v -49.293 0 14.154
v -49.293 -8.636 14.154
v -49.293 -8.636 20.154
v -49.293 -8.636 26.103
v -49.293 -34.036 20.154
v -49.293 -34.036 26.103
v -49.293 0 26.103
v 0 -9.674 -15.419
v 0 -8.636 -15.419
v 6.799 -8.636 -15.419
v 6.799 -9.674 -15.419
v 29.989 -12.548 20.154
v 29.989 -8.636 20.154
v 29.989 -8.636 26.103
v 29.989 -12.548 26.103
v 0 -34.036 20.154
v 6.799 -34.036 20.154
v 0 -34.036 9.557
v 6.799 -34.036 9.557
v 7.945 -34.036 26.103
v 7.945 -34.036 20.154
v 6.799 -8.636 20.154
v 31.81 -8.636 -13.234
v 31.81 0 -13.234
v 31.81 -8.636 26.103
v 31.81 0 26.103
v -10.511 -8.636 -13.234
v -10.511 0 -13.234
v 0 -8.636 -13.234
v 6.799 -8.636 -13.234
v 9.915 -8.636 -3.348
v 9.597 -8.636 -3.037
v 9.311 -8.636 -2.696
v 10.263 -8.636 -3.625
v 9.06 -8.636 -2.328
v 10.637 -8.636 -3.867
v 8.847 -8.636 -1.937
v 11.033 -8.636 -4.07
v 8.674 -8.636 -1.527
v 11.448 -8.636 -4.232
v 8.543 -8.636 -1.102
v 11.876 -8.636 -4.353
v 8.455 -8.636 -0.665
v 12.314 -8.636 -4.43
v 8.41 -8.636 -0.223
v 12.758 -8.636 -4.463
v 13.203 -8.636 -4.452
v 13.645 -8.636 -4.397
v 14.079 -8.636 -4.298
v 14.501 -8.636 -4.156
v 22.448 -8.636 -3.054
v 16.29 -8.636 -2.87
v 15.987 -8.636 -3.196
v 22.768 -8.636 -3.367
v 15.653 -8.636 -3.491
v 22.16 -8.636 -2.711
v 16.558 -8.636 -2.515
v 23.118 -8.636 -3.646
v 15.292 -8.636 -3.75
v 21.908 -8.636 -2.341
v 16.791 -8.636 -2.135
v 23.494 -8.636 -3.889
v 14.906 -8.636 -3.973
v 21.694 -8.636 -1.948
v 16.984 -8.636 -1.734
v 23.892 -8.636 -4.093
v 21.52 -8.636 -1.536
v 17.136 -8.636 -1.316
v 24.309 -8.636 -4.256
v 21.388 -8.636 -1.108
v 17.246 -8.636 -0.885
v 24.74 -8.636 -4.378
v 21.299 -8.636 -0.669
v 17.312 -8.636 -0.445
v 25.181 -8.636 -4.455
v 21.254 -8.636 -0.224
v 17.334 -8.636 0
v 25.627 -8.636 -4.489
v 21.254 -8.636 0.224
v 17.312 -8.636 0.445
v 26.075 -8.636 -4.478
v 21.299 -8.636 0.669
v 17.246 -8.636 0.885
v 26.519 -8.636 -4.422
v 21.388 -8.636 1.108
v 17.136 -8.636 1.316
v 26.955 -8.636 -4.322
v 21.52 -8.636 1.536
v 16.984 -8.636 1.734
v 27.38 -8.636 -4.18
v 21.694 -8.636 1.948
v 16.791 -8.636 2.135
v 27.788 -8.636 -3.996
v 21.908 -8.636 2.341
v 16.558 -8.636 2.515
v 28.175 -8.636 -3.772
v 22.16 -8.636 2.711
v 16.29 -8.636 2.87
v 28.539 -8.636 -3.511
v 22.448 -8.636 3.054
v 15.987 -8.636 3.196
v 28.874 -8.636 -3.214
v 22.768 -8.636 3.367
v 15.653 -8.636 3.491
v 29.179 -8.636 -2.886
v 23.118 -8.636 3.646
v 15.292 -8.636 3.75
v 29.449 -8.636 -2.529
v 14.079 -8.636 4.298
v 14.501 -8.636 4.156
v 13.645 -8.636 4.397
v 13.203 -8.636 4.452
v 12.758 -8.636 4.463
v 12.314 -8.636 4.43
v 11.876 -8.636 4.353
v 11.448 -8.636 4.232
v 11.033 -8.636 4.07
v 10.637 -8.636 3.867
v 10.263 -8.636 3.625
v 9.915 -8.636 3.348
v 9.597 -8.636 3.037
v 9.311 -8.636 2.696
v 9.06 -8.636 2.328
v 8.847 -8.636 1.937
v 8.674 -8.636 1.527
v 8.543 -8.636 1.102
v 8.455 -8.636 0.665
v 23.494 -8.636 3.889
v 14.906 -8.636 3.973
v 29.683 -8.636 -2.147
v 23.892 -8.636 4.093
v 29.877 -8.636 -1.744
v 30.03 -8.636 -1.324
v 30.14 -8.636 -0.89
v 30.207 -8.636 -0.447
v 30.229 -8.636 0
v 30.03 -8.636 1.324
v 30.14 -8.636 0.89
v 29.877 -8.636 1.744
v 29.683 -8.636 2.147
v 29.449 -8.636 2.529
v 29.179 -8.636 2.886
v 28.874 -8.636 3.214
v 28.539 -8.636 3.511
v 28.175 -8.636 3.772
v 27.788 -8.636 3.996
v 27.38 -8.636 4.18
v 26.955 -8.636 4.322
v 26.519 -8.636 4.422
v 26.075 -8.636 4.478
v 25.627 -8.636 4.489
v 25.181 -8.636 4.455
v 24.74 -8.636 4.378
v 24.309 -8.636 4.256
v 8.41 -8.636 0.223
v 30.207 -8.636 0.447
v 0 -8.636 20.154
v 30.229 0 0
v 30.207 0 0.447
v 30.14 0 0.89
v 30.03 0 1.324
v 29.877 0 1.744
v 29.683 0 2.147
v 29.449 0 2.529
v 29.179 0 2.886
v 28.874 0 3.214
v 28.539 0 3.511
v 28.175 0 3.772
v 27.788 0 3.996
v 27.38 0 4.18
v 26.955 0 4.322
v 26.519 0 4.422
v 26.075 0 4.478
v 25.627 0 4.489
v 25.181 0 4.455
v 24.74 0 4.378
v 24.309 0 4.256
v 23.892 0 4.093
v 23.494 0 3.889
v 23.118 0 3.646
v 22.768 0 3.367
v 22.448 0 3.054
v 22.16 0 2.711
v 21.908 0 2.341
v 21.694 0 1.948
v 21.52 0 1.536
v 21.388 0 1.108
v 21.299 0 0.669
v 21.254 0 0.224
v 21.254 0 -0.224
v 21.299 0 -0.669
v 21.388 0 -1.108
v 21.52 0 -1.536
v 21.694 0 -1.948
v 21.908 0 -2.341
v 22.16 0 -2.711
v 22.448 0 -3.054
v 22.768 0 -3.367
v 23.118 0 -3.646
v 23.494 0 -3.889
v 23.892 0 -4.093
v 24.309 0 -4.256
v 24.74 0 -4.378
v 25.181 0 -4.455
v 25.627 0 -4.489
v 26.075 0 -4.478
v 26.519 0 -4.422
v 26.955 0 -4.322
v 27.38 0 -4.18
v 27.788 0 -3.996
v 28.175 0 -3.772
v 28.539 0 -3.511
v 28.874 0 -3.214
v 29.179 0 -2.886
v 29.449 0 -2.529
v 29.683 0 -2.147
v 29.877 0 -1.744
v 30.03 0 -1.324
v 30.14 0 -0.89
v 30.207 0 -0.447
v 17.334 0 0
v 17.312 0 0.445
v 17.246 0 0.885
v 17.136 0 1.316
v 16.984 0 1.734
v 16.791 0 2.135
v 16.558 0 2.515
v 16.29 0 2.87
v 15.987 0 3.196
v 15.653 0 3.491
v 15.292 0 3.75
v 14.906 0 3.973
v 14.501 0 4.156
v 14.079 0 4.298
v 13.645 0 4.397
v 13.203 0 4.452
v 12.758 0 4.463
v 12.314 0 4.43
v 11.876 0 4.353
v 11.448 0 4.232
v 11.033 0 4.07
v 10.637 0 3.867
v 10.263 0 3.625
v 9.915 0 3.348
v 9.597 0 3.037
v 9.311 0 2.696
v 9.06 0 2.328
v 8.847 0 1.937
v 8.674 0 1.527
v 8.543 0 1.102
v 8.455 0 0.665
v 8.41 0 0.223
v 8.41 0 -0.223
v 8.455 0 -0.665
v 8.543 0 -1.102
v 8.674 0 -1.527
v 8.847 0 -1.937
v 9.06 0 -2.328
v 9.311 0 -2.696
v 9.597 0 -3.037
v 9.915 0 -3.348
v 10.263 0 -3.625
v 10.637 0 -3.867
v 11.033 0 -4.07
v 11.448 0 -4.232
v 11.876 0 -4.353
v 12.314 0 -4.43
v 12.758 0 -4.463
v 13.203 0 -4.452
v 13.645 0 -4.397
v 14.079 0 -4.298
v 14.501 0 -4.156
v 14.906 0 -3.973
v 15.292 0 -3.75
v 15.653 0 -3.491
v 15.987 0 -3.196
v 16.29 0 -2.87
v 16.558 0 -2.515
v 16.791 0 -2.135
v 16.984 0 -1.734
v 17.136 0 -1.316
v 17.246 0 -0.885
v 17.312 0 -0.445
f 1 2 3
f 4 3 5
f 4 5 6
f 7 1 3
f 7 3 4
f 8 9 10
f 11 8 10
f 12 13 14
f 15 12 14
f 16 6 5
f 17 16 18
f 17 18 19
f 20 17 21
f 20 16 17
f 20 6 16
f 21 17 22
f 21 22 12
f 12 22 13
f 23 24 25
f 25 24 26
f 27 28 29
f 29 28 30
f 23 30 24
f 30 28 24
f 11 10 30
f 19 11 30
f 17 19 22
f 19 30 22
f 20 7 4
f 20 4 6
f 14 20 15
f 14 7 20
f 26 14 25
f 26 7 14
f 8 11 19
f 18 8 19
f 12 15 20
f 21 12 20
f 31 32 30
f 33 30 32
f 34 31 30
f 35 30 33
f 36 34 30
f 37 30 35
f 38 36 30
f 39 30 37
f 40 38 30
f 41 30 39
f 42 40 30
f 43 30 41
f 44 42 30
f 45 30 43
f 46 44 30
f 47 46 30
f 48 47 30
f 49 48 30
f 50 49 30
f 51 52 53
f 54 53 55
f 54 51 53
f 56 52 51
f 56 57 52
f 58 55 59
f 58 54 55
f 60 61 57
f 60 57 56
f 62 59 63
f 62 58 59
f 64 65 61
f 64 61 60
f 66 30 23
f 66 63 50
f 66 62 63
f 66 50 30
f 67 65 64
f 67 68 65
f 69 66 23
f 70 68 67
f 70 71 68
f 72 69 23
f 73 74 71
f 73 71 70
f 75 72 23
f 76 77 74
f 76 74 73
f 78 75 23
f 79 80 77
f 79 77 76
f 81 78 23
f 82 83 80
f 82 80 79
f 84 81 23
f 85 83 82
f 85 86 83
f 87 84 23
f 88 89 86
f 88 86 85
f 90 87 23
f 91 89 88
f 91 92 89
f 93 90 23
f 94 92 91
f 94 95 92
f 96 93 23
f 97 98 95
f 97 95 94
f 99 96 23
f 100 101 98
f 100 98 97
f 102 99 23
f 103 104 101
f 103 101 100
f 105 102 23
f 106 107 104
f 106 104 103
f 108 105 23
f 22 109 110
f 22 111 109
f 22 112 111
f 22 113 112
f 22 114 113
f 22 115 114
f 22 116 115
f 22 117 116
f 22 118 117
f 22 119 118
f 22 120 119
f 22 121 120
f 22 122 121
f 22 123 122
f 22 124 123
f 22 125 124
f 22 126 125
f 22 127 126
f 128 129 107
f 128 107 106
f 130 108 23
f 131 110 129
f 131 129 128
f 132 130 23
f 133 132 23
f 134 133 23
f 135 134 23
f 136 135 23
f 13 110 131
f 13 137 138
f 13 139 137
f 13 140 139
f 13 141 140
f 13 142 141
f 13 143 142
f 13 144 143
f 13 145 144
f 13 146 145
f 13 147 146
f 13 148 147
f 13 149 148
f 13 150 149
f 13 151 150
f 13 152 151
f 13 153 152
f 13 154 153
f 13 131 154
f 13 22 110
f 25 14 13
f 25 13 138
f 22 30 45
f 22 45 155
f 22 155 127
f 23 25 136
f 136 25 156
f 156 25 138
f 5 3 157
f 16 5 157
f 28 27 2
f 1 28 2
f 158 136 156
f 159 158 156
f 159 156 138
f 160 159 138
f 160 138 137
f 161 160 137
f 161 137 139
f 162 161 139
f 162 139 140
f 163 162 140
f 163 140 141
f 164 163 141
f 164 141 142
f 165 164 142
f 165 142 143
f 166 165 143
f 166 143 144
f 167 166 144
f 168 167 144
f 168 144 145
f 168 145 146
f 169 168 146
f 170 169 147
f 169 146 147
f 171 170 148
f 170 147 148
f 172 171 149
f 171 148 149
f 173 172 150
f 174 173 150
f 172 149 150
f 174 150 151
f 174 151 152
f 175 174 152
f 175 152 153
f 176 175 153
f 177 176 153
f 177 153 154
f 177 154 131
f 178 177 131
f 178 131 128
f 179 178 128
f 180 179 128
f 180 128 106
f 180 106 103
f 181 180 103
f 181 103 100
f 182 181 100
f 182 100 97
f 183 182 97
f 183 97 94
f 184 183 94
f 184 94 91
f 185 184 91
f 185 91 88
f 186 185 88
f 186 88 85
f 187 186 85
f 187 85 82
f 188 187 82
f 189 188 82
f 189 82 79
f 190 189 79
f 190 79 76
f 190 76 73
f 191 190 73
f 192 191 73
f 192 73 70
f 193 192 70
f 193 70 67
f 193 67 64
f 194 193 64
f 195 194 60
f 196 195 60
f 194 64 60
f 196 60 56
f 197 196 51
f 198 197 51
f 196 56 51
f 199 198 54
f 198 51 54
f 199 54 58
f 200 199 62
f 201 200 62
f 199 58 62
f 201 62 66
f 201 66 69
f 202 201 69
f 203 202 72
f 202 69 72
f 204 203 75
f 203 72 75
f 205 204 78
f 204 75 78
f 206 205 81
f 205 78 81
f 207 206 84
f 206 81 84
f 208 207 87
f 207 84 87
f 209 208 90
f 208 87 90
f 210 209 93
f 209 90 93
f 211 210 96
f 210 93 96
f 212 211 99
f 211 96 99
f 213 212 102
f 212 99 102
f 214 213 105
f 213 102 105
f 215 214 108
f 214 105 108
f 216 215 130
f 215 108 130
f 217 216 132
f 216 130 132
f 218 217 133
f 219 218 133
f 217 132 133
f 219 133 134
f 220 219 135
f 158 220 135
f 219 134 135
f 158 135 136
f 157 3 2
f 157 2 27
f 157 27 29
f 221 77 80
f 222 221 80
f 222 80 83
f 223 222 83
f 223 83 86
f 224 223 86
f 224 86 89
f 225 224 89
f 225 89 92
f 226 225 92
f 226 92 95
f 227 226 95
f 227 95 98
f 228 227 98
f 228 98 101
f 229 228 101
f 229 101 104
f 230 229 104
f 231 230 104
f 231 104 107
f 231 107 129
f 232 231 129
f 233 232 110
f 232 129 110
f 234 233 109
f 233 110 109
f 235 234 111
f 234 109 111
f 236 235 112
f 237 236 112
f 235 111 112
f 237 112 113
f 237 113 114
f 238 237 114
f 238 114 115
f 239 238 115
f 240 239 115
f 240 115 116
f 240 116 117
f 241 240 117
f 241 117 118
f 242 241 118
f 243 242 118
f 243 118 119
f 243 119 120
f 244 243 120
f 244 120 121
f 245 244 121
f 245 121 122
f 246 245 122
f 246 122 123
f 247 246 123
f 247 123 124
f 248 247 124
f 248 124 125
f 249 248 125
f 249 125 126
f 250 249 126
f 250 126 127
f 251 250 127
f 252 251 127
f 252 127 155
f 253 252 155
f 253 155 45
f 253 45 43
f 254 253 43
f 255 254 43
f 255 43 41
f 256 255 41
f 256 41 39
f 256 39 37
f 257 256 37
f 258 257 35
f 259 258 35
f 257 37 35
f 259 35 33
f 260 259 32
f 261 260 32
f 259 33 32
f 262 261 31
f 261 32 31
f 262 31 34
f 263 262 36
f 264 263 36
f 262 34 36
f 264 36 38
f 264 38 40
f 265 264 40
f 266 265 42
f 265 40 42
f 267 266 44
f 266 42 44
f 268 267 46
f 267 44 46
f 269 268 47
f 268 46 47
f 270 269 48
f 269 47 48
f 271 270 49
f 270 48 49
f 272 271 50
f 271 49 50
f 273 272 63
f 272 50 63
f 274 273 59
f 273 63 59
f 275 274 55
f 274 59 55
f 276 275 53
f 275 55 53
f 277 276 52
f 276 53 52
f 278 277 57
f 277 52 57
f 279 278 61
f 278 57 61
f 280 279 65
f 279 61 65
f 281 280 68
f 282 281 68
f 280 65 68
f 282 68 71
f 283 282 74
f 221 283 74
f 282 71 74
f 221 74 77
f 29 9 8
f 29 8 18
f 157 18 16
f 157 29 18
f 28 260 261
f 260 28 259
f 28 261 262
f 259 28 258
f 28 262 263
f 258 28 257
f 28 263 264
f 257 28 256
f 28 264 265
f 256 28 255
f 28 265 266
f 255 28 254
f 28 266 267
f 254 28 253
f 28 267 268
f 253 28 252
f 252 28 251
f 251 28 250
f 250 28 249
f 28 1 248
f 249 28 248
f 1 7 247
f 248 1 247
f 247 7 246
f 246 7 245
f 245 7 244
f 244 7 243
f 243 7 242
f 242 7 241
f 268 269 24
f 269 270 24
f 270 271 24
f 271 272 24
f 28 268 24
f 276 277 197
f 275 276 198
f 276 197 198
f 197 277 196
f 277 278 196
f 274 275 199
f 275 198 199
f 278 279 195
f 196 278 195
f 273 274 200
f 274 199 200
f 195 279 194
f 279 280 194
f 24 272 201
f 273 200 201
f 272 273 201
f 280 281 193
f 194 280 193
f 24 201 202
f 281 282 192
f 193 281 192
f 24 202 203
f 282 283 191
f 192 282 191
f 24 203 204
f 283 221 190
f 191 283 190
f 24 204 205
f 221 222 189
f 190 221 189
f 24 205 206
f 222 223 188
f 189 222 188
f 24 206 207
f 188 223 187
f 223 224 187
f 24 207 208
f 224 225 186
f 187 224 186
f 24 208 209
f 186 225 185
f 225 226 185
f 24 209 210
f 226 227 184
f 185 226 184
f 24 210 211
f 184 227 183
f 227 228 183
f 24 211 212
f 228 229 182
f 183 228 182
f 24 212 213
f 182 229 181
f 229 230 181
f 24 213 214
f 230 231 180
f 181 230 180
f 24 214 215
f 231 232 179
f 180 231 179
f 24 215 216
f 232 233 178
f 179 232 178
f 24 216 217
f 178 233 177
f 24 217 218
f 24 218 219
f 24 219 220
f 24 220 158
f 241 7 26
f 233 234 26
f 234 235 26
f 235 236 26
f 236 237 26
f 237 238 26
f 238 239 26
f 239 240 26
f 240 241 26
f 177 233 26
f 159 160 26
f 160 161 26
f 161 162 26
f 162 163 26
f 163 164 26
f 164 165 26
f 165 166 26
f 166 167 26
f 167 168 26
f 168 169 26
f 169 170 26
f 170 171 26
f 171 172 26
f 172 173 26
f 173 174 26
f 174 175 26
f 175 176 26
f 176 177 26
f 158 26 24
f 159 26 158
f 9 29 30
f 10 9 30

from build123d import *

# Parameters (mm, degrees)
F0_W      = 81.1027027667
F0_H      = 39.3372392282
F1_DEPTH  = 8.636
F3_DEPTH  = 25.4
F4_W      = 79.281533137
F4_H      = 5.9491507709
F5_DEPTH  = 25.4
F6_W      = 6.7990301177
F6_H      = 35.5734908953
F7_DEPTH  = 25.4
F9_DEPTH  = 25.4
F10_R     = 4.4646843998
F10_R_2   = 4.4902635422
F11_DEPTH = 25.4
F13_DEPTH = 25.4


with BuildPart() as f1:
    # F0 (on Front) → F1 (new body)
    with BuildSketch(Plane.XZ):
        with Locations((-8.7416078895, 6.434794981)):
            Rectangle(F0_W, F0_H)
    extrude(amount=F1_DEPTH)

    # F2 (on face) → F3 (cut)
    with BuildSketch(Plane.XZ.offset(8.636)):
        Polygon((-49.2929592729, -13.2338246331), (-10.5112984066, -13.2338246331), (-49.2929592729, 14.1543564849), align=None)
    extrude(amount=-F3_DEPTH, mode=Mode.SUBTRACT)

    # F4 (on face) → F5 (join)
    with BuildSketch(Plane.XZ.offset(8.636)):
        with Locations((-9.6521927044, 23.1288392097)):
            Rectangle(F4_W, F4_H)
    extrude(amount=F5_DEPTH)

    # F6 (on face) → F7 (join)
    with BuildSketch(Plane.XZ.offset(8.636)):
        with Locations((3.3995150588, 2.3675183766)):
            Rectangle(F6_W, F6_H)
    extrude(amount=F7_DEPTH)

    # F8 (on face) → F9 (cut)
    with BuildSketch(Plane.YZ.offset(6.7990301177)):
        Polygon((-34.036, -15.4192270711), (-9.674085426, -15.4192270711), (-34.036, 9.5568542875), align=None)
    extrude(amount=-F9_DEPTH, mode=Mode.SUBTRACT)

    # F10 (on face) → F11 (cut)
    with BuildSketch(Plane.XZ.offset(8.636)):
        with Locations((12.8695918247, 0)):
            Circle(F10_R)
        with Locations((25.7391780615, 0)):
            Circle(F10_R_2)
    extrude(amount=-F11_DEPTH, mode=Mode.SUBTRACT)

    # F12 (on face) → F13 (cut)
    with BuildSketch(Plane.XY.offset(26.1034145951)):
        Polygon((29.9885738641, -34.036), (29.9885738641, -12.5484813482), (7.9453402096, -34.036), align=None)
    extrude(amount=-F13_DEPTH, mode=Mode.SUBTRACT)


solid = f1.part
